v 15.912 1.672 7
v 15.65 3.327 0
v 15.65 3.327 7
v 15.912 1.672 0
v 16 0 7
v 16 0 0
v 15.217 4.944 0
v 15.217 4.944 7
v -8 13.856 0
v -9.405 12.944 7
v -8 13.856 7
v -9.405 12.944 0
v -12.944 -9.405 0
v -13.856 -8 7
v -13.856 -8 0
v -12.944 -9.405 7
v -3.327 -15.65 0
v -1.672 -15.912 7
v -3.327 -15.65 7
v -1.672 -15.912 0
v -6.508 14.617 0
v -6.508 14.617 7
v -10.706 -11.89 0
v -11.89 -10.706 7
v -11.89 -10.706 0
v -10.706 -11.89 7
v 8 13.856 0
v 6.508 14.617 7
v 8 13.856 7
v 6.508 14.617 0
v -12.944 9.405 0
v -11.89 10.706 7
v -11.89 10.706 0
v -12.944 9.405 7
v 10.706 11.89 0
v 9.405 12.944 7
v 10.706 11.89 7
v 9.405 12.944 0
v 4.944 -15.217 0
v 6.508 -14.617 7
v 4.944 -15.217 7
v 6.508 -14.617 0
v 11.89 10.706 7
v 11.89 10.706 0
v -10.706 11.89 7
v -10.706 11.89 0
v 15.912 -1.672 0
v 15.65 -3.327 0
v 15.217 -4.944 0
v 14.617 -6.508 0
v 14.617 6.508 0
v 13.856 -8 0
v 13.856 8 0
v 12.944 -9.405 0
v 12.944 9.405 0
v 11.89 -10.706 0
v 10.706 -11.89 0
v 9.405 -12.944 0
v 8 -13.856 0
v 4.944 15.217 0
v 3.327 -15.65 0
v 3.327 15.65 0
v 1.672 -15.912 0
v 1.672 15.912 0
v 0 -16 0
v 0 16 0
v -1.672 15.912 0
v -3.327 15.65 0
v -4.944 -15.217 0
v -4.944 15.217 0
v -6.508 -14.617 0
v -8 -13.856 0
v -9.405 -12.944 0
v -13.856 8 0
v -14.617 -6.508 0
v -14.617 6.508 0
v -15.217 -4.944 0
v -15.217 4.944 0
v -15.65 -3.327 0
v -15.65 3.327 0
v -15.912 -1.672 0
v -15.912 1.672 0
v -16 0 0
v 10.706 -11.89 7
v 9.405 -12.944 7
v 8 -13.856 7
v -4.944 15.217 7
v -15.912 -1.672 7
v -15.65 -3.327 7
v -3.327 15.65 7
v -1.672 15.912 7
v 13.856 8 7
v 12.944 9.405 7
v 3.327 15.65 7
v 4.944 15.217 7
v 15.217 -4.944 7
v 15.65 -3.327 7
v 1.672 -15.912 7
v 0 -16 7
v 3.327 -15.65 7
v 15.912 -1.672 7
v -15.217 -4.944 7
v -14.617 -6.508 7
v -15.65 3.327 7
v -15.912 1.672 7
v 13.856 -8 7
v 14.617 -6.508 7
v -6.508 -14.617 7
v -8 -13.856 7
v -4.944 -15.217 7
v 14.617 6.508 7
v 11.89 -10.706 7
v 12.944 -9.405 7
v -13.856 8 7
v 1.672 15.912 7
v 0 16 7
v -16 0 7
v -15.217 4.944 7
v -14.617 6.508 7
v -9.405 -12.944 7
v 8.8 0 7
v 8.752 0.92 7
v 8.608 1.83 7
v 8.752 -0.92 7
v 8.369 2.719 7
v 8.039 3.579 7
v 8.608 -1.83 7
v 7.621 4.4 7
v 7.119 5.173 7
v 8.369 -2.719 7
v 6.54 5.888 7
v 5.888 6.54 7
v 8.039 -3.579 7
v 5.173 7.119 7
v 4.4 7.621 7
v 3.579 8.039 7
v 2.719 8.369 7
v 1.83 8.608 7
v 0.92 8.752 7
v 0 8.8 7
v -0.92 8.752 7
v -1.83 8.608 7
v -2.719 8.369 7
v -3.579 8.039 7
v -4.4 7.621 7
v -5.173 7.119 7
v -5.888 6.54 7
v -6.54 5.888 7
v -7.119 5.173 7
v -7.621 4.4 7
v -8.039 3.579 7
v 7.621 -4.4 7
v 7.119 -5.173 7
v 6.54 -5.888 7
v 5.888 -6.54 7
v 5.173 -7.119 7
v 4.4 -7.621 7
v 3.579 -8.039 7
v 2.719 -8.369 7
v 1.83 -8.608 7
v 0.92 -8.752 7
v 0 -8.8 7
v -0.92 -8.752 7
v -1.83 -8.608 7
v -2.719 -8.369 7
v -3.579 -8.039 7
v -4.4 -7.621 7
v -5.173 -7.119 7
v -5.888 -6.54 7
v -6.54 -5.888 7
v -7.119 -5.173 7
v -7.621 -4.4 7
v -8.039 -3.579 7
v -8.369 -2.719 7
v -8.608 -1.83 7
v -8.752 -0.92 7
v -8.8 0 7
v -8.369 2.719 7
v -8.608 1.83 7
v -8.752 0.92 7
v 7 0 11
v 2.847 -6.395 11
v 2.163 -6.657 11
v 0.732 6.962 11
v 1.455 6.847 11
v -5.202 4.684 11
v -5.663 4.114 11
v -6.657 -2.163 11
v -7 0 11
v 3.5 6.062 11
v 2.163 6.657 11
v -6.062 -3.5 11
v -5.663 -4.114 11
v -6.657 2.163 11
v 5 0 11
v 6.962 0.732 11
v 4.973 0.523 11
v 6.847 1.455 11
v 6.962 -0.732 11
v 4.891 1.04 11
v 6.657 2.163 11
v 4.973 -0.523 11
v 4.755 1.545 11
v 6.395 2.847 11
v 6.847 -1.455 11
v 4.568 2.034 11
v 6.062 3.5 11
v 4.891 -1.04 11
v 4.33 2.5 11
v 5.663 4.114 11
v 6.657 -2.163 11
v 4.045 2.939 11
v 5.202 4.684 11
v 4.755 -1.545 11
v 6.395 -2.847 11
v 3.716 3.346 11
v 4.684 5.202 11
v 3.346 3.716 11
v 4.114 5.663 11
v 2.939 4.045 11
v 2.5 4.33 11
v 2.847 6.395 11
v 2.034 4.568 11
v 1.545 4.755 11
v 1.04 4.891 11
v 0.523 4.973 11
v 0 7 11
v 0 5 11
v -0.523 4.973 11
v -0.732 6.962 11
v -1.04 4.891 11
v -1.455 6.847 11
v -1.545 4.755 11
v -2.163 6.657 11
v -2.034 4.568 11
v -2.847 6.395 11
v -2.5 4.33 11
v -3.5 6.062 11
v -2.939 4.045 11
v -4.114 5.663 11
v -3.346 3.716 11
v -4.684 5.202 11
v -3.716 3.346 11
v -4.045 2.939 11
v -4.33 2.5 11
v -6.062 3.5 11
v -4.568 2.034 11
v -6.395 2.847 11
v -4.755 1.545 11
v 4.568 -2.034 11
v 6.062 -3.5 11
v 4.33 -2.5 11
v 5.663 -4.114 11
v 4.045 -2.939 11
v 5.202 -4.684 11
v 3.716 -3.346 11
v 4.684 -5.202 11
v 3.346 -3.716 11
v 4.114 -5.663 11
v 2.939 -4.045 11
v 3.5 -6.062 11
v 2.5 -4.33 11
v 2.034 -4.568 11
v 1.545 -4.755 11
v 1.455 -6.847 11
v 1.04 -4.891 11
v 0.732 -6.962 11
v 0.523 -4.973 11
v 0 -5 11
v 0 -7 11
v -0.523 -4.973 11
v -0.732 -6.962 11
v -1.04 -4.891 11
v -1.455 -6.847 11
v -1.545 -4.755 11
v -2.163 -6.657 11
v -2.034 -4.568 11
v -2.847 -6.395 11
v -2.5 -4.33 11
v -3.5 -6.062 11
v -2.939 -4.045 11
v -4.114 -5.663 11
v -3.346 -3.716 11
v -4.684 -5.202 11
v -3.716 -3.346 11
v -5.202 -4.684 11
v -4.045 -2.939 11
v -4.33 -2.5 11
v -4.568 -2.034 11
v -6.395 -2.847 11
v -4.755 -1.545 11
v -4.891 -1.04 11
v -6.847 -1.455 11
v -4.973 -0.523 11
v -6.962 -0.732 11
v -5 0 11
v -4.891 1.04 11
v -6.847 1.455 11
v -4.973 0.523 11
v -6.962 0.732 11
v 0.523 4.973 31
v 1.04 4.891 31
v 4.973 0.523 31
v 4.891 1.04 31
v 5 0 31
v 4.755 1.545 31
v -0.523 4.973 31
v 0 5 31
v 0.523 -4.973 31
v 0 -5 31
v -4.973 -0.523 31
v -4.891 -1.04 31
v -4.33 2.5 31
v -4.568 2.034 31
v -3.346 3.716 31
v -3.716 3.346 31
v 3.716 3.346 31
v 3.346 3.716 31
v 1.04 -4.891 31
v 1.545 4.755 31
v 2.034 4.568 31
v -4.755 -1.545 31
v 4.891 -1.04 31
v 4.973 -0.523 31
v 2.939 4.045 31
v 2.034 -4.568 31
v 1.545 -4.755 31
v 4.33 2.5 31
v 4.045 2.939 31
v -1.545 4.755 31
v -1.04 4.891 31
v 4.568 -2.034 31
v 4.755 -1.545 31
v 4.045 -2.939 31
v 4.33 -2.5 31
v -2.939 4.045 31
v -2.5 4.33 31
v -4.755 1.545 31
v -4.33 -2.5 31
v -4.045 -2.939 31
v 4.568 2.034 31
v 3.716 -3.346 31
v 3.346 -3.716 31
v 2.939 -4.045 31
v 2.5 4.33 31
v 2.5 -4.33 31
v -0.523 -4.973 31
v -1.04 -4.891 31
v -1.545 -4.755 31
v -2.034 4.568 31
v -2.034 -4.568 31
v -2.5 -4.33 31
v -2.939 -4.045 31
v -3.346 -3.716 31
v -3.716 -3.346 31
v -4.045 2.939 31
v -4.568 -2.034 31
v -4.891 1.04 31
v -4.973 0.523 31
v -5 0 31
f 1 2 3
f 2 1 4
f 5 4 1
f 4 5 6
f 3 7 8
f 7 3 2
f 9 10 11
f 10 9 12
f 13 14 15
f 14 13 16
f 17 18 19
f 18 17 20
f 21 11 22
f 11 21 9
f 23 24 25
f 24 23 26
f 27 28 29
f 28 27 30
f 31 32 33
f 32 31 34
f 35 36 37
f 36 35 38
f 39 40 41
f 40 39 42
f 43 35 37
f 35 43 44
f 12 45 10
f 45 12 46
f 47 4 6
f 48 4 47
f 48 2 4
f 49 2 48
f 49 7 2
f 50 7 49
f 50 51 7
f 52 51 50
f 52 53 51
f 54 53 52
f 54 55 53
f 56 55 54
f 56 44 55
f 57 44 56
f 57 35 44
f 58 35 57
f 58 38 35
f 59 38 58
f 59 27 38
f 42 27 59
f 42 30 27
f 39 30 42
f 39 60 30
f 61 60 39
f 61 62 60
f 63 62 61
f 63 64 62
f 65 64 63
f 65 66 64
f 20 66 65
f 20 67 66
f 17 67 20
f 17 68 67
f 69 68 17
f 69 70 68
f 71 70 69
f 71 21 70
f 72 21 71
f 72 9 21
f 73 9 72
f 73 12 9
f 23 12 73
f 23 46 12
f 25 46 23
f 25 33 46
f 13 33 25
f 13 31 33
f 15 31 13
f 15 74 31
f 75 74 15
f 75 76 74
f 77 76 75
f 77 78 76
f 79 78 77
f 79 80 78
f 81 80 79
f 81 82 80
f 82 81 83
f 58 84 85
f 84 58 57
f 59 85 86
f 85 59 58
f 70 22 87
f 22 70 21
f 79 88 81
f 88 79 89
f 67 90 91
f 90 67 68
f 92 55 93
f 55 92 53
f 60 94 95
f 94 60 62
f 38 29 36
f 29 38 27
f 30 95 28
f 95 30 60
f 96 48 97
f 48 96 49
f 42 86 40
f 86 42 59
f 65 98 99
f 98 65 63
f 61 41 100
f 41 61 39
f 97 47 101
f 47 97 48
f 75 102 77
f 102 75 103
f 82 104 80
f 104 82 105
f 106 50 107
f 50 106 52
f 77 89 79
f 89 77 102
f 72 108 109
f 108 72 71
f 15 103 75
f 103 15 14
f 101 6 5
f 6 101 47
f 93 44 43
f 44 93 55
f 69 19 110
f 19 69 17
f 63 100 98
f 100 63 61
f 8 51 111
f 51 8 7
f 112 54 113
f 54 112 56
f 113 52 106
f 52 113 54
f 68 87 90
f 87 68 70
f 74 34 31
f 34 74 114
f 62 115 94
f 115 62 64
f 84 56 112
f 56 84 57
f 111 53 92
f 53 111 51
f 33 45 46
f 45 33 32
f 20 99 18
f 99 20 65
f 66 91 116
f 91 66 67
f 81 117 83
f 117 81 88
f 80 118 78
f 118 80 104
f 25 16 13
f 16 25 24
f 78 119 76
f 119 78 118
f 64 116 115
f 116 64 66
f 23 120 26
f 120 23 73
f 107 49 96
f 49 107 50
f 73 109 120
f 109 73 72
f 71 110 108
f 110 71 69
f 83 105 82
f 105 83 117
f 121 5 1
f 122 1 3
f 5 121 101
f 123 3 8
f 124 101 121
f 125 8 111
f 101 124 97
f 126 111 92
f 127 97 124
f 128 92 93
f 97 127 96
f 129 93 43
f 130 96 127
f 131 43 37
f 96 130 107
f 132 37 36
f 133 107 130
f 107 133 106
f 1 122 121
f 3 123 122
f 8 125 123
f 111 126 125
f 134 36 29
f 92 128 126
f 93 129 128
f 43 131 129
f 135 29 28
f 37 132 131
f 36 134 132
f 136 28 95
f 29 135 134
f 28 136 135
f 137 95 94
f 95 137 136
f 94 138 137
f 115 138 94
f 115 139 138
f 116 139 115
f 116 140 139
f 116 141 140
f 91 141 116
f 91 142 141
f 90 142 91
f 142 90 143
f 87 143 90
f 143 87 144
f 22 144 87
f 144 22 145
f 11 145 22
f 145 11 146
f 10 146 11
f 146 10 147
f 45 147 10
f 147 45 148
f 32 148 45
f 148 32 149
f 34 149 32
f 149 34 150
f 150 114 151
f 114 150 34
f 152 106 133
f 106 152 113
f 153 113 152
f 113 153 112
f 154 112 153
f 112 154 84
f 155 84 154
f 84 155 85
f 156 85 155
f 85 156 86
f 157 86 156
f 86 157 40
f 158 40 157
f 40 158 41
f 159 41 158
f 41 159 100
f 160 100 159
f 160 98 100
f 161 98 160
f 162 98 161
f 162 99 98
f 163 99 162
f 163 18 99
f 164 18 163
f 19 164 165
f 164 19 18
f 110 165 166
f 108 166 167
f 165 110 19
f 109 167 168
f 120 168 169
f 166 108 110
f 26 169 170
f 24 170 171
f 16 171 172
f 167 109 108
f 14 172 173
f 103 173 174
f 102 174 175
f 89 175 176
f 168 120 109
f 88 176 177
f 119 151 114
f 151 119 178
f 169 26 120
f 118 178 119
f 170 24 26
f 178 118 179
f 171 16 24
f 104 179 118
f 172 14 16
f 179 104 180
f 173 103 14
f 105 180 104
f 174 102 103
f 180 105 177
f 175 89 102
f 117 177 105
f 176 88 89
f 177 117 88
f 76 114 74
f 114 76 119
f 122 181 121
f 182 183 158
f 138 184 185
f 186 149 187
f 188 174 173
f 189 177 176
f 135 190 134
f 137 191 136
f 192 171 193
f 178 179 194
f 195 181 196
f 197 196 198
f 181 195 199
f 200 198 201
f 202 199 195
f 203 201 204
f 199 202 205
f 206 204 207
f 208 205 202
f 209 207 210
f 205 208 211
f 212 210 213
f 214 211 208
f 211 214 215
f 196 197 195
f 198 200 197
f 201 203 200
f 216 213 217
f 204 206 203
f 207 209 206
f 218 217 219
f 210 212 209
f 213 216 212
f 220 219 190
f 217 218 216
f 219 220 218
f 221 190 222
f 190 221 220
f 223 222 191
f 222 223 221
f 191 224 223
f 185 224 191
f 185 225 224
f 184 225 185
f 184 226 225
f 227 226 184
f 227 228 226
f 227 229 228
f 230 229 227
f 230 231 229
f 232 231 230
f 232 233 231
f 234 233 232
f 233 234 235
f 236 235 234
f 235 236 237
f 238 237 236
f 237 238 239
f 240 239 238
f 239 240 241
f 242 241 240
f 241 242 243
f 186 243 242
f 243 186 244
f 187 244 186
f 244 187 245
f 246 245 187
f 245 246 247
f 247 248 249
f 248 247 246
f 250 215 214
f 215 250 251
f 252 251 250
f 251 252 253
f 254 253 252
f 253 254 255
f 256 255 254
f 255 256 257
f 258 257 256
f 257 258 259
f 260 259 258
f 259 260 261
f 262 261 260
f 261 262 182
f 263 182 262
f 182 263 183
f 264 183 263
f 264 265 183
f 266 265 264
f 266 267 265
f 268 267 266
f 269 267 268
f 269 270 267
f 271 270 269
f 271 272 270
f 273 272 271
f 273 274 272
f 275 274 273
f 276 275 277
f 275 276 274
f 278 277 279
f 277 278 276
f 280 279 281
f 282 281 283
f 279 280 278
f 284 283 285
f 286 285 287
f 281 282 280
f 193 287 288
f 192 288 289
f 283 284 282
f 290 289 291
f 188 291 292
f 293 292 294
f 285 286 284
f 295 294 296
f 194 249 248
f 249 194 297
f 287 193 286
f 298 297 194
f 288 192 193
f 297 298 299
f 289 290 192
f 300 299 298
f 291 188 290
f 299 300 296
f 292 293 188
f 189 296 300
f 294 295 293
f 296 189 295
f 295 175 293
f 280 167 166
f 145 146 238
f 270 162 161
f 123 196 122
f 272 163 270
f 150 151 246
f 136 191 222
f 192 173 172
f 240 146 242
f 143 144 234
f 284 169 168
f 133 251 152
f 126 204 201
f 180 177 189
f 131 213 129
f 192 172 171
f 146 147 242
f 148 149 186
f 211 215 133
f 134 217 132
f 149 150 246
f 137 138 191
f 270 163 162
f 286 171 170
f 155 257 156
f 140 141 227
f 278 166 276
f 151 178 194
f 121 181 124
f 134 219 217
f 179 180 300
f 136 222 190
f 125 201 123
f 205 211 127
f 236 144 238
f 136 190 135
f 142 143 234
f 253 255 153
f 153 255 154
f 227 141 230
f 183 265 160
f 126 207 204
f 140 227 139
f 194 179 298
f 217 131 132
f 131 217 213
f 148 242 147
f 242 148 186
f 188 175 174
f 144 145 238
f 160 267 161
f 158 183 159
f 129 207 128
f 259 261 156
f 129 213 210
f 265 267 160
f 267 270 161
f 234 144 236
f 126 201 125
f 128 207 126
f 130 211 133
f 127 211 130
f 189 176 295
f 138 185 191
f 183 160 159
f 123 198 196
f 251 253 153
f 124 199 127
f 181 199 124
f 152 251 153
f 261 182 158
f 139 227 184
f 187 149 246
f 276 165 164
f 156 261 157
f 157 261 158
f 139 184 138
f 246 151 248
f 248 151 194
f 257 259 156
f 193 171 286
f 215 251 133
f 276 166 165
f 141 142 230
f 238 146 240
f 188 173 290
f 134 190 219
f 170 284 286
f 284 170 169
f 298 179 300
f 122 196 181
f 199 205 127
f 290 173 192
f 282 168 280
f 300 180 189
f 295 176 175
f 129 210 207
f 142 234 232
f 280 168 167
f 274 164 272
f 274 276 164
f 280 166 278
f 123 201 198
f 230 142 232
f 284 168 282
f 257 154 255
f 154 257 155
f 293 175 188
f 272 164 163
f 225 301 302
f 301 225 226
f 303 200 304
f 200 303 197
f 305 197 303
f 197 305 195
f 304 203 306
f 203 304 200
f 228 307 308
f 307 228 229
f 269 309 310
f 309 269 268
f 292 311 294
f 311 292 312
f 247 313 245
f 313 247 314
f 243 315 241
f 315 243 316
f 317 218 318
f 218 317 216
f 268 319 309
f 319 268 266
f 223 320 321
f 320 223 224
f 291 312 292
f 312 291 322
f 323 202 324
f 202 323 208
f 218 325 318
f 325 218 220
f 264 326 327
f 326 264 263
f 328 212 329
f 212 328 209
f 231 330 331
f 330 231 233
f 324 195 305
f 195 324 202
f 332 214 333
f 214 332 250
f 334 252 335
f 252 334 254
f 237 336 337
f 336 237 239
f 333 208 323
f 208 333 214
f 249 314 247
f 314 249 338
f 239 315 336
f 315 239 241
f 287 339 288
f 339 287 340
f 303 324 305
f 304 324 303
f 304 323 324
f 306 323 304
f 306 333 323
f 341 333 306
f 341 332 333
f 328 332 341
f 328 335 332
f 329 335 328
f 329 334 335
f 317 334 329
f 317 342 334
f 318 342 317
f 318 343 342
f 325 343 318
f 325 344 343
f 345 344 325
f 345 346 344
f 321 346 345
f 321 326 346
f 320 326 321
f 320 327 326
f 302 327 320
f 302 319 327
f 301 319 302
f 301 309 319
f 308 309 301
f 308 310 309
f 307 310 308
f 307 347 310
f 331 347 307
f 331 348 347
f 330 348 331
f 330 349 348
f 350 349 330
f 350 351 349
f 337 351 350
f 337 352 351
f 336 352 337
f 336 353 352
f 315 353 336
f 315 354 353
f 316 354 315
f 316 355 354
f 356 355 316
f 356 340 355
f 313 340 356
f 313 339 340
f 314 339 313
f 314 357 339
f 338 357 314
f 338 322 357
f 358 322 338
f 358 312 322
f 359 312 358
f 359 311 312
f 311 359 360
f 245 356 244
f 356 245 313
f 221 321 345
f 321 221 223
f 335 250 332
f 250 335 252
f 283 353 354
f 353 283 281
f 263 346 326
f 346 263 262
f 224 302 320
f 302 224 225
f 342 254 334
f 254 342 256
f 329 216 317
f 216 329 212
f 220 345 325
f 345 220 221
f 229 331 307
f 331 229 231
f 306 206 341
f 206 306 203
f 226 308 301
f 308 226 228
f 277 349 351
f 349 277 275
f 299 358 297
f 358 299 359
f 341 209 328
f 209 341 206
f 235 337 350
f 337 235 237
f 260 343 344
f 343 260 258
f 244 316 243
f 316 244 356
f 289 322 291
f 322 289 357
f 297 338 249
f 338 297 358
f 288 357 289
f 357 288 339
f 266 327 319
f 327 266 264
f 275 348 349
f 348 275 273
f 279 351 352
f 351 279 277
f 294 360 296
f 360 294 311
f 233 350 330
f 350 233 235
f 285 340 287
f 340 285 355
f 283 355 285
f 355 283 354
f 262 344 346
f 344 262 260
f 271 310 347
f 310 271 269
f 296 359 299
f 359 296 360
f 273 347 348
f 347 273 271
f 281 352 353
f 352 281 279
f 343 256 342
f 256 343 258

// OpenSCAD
// Adjustable leveling foot, smooth threaded-shaft representation.
$fn = 60;
eps = 0.02;
shaft_d = 10;
pad_d = 32;
shaft_l = 20;
pad_h = 7;
union() {
    cylinder(d = pad_d, h = pad_h);
    translate([0, 0, pad_h]) cylinder(d1 = pad_d * 0.55, d2 = shaft_d + 4, h = 4);
    translate([0, 0, pad_h + 4]) cylinder(d = shaft_d, h = shaft_l);
}
